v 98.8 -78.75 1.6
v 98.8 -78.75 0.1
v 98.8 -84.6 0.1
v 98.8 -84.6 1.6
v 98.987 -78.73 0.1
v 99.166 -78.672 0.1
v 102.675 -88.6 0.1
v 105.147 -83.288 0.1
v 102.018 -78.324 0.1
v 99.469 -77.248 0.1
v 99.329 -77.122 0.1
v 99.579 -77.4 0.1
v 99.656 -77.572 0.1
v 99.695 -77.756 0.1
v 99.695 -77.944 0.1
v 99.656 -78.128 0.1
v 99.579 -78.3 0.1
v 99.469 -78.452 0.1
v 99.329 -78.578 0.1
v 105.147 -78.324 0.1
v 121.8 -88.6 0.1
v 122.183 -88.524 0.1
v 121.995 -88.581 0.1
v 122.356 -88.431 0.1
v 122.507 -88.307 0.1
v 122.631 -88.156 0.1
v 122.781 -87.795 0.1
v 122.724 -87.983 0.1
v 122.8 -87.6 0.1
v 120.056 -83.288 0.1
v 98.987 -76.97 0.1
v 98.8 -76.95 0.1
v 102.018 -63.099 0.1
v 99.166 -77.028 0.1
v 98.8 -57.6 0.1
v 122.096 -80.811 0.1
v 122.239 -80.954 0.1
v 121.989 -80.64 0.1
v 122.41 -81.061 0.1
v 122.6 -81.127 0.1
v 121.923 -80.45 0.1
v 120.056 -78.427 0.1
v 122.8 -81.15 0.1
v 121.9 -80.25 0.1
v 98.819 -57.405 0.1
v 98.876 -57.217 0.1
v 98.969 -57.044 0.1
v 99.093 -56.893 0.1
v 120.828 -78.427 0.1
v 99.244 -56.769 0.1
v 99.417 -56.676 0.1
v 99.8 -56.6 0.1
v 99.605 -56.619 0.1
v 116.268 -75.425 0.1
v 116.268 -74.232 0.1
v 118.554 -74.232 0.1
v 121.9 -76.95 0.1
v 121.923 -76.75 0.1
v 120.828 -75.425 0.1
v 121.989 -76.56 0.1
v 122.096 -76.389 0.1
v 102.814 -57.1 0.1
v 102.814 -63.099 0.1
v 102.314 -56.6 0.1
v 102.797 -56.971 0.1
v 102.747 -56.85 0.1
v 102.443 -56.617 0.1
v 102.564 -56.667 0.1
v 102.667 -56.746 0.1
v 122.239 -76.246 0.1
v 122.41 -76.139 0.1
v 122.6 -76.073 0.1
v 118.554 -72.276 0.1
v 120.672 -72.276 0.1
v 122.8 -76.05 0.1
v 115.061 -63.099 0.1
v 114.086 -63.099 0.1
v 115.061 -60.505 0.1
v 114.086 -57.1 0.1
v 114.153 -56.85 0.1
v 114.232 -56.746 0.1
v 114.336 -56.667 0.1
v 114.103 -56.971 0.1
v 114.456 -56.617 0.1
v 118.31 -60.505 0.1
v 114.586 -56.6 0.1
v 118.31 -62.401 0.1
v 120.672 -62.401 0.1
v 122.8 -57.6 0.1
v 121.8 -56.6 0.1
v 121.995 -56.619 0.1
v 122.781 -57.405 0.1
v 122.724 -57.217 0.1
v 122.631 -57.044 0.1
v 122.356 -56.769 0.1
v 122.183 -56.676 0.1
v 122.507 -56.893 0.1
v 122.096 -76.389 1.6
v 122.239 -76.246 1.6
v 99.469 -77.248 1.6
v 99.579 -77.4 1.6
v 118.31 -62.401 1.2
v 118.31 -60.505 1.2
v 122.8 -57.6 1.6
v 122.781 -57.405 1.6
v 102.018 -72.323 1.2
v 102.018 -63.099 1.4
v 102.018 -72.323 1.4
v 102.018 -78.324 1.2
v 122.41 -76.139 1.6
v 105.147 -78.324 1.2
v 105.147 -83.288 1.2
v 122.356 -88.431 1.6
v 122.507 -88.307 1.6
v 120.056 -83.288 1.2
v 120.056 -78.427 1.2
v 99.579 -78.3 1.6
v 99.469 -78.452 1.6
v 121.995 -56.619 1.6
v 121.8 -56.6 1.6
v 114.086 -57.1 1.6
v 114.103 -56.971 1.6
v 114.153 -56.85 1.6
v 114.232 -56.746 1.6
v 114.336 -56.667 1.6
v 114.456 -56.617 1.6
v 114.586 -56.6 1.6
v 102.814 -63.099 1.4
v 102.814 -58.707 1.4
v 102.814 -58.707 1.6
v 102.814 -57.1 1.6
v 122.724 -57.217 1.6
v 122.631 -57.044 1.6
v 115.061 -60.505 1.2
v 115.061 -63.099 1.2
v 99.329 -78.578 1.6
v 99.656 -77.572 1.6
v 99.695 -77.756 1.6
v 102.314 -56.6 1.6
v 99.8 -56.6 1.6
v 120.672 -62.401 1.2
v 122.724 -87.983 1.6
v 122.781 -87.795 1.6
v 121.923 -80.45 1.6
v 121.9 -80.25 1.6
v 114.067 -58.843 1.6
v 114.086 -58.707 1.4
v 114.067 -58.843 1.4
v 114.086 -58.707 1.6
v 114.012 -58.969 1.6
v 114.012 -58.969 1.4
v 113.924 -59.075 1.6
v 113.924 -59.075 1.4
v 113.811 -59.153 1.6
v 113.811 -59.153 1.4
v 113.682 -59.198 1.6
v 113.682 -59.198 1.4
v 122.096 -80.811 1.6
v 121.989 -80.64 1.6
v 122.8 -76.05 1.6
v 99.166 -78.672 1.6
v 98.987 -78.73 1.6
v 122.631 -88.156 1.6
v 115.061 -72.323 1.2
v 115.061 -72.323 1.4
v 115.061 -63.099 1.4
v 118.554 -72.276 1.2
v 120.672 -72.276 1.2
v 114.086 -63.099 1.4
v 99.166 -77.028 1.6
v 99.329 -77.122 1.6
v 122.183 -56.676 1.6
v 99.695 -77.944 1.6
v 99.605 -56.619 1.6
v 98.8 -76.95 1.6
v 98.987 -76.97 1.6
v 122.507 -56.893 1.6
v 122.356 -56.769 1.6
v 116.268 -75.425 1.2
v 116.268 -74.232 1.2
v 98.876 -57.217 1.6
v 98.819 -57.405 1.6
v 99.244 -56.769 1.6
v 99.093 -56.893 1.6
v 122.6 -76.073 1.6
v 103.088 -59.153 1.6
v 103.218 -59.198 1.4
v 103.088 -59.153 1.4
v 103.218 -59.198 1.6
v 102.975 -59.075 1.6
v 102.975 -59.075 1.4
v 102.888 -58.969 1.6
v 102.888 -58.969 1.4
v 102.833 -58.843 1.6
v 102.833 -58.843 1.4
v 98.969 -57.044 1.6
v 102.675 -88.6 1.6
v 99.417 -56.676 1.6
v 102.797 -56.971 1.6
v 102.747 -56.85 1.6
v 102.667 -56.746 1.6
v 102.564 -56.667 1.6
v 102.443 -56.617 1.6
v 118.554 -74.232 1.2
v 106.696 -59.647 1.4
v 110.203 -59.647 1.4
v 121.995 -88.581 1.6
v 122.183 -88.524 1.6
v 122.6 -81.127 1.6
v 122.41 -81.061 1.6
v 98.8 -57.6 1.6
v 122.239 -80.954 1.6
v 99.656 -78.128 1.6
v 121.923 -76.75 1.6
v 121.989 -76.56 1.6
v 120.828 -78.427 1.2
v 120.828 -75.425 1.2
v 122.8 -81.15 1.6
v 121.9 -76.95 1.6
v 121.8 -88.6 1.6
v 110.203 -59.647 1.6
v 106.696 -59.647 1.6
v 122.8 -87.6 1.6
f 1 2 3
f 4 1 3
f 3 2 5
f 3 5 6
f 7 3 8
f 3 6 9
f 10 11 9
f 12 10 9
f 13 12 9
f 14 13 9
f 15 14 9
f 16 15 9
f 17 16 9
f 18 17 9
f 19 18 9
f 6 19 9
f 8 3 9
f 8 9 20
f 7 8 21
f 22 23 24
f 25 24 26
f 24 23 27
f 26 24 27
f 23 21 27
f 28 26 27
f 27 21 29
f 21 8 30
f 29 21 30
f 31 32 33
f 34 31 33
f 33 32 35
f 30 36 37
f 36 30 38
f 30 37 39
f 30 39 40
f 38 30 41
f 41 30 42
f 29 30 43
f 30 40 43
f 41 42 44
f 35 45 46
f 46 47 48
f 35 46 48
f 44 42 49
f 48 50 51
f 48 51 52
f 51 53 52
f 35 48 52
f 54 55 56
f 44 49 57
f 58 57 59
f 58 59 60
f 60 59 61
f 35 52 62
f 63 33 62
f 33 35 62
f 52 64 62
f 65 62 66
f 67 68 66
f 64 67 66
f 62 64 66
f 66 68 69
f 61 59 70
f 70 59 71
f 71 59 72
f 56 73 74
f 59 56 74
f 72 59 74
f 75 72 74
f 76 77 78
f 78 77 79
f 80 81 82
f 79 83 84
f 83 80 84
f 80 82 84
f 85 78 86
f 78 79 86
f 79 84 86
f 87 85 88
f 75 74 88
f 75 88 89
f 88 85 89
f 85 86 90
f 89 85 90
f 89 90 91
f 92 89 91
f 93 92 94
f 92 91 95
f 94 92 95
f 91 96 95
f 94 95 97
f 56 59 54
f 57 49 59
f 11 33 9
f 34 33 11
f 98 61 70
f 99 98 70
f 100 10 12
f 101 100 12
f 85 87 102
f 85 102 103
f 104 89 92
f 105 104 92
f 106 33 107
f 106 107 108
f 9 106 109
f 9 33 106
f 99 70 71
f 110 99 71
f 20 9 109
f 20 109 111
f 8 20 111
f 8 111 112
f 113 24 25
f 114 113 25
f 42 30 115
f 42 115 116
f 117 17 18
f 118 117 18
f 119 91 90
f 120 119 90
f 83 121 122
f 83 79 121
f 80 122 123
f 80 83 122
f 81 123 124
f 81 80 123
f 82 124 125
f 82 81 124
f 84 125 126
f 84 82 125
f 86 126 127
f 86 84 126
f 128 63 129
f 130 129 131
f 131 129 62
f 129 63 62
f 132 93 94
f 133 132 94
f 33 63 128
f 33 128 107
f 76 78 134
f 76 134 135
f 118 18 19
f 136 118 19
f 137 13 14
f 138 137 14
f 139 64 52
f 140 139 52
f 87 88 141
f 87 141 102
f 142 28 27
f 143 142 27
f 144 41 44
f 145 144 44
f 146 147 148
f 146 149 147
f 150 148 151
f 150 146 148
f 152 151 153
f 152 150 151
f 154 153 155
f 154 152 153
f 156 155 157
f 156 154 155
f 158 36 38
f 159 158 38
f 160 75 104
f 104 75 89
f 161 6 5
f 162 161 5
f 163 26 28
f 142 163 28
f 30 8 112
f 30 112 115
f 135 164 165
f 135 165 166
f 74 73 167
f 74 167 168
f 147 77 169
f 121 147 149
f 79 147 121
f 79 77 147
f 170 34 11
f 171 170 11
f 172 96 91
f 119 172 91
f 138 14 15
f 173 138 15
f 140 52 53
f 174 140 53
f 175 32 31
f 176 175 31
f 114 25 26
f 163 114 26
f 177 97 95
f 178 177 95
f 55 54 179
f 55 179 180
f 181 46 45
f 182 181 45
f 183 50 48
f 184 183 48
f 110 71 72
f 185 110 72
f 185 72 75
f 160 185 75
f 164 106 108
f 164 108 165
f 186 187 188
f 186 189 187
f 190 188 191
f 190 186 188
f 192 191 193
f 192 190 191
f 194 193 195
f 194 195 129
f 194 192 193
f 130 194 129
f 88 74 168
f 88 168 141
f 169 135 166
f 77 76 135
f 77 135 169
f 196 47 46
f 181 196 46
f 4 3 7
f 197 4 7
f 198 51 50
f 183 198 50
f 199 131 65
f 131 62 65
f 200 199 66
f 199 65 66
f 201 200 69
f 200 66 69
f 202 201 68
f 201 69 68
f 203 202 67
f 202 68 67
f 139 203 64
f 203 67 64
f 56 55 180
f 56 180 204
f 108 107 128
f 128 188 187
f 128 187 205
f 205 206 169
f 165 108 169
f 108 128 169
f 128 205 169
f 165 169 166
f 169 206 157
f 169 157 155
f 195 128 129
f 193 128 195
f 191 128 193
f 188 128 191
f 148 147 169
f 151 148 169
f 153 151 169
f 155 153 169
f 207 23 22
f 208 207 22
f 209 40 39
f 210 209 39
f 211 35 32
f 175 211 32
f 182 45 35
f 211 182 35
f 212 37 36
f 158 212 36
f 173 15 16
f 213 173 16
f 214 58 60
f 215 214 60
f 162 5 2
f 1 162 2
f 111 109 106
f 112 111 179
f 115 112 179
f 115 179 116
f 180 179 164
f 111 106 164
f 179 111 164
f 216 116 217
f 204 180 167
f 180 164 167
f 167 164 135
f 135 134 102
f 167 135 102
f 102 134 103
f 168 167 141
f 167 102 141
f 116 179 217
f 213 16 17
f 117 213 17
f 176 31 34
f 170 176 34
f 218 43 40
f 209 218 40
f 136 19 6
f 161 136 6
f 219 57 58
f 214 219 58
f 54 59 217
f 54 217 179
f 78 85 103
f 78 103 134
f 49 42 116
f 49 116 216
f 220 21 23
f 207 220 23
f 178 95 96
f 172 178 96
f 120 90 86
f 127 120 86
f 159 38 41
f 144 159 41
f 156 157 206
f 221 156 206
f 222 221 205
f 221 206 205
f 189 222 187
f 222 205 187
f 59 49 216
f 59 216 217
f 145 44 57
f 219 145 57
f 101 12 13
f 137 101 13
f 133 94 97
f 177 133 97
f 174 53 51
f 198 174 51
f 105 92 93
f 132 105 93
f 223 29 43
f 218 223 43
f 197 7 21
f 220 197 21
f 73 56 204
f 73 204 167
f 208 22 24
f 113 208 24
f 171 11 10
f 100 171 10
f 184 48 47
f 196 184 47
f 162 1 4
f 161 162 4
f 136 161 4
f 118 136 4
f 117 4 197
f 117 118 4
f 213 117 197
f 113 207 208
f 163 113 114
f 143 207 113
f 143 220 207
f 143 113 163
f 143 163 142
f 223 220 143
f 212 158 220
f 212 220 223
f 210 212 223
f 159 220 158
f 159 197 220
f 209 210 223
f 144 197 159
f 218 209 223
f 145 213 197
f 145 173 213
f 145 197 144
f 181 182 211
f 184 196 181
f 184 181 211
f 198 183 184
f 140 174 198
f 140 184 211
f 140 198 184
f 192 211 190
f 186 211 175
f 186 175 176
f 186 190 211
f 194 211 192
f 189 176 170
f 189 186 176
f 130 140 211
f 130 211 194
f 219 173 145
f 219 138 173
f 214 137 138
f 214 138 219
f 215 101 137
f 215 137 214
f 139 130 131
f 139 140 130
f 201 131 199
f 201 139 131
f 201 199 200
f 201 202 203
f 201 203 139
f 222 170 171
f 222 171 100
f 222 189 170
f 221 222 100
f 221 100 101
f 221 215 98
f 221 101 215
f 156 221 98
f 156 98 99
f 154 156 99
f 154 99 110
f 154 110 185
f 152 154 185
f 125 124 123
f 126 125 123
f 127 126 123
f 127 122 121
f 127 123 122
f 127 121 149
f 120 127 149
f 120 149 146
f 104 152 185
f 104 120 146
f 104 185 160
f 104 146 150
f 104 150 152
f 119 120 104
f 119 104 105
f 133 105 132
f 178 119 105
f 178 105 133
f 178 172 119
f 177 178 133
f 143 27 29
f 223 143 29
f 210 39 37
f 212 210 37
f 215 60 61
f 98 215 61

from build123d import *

# Parameters (mm, degrees)
AUFSATZ_LINEAR_START            = 0.1
AUFSATZ_LINEAR_AUSTRAGEN1_DEPTH = 1.5
SCHNITT_LINEAR_AUSTRAGEN1_DEPTH = 1.2
SKIZZE3_W                       = 13.0432381
SKIZZE3_H                       = 9.22364084
SCHNITT_LINEAR_AUSTRAGEN2_DEPTH = 1.4
SKIZZE4_W                       = 11.271857287
SKIZZE4_H                       = 8.011580578
SCHNITT_LINEAR_AUSTRAGEN3_DEPTH = 1.4
SCHNITT_LINEAR_AUSTRAGEN4_DEPTH = 152.434342208
VERRUNDUNG1_R                   = 0.5
VERRUNDUNG2_R                   = 0.5


with BuildPart() as part:
    # Skizze1 → Aufsatz-Linear austragen1 (new body)
    with BuildSketch(Plane.XY.offset(AUFSATZ_LINEAR_START)):
        Polygon((121.99509, -56.619215), (121.8, -56.6), (99.8, -56.6), (99.60491, -56.619215), (99.417317, -56.676121), (99.24443, -56.768531), (99.092894, -56.892894), (98.968531, -57.04443), (98.876121, -57.217317), (98.819215, -57.40491), (98.8, -57.6), (98.8, -76.95), (98.987121, -76.969667), (99.166063, -77.027809), (99.329007, -77.121885), (99.46883, -77.247782), (99.579423, -77.4), (99.655951, -77.571885), (99.69507, -77.755924), (99.69507, -77.944076), (99.655951, -78.128115), (99.579423, -78.3), (99.46883, -78.452218), (99.329007, -78.578115), (99.166063, -78.672191), (98.987121, -78.730333), (98.8, -78.75), (98.8, -84.6), (102.675, -88.6), (121.8, -88.6), (121.99509, -88.580785), (122.182683, -88.52388), (122.35557, -88.43147), (122.507107, -88.307107), (122.63147, -88.15557), (122.72388, -87.982683), (122.780785, -87.79509), (122.8, -87.6), (122.8, -81.15), (122.599731, -81.127435), (122.409505, -81.060872), (122.238859, -80.953648), (122.096352, -80.811141), (121.989128, -80.640495), (121.922565, -80.450269), (121.9, -80.25), (121.9, -76.95), (121.922565, -76.749731), (121.989128, -76.559505), (122.096352, -76.388859), (122.238859, -76.246352), (122.409505, -76.139128), (122.599731, -76.072565), (122.8, -76.05), (122.8, -57.6), (122.780785, -57.40491), (122.72388, -57.217317), (122.63147, -57.04443), (122.507107, -56.892893), (122.35557, -56.76853), (122.182683, -56.67612), align=None)
    extrude(amount=AUFSATZ_LINEAR_AUSTRAGEN1_DEPTH)

    # Skizze2 → Schnitt-Linear austragen1 (cut)
    with BuildSketch(Plane.XY):
        Polygon((102.017864846, -63.099173962), (102.017864846, -78.324168195), (105.146811161, -78.324168195), (105.146811161, -83.287975006), (120.056496088, -83.287975006), (120.056496088, -78.427117377), (120.827696552, -78.427117377), (120.827696552, -75.425497639), (116.267566255, -75.425497639), (116.267566255, -74.231533011), (118.554332467, -74.231533011), (118.554332467, -72.276257259), (120.6715821, -72.276257259), (120.6715821, -62.401228596), (118.309565205, -62.401228596), (118.309565205, -60.50461088), (115.061102946, -60.50461088), (115.061102946, -63.099173962), align=None)
    extrude(amount=SCHNITT_LINEAR_AUSTRAGEN1_DEPTH, mode=Mode.SUBTRACT)

    # Skizze3 → Schnitt-Linear austragen2 (cut)
    with BuildSketch(Plane.XY):
        with Locations((108.539483896, -67.710994382)):
            Rectangle(SKIZZE3_W, SKIZZE3_H)
    extrude(amount=SCHNITT_LINEAR_AUSTRAGEN2_DEPTH, mode=Mode.SUBTRACT)

    # Skizze4 → Schnitt-Linear austragen3 (cut)
    with BuildSketch(Plane.XY):
        with Locations((108.449834452, -59.786485977)):
            Rectangle(SKIZZE4_W, SKIZZE4_H)
    extrude(amount=SCHNITT_LINEAR_AUSTRAGEN3_DEPTH, mode=Mode.SUBTRACT)

    # Skizze5 → Schnitt-Linear austragen4 (cut, through all)
    with BuildSketch(Plane.XY):
        with BuildLine():
            Line((114.085763095, -56.6), (114.085763095, -59.115588122))
            ThreePointArc((114.085763095, -59.115588122), (108.449834452, -59.703189112), (102.813905808, -59.115588122))
            Line((102.813905808, -59.115588122), (102.813905808, -56.6))
            Line((102.813905808, -56.6), (114.085763095, -56.6))
        make_face()
    extrude(amount=SCHNITT_LINEAR_AUSTRAGEN4_DEPTH, mode=Mode.SUBTRACT)

    # Verrundung1
    verrundung1_edges = [part.edges().sort_by_distance(p)[0] for p in [
        (102.813905808, -56.6, 0.85),
        (114.085763095, -56.6, 0.85),
    ]]
    fillet(verrundung1_edges, radius=VERRUNDUNG1_R)

    # Verrundung2
    verrundung2_edges = [part.edges().sort_by_distance(p)[0] for p in [
        (114.085763095, -59.115588122, 1.5),
        (102.813905808, -59.115588122, 1.5),
    ]]
    fillet(verrundung2_edges, radius=VERRUNDUNG2_R)


solid = part.part
